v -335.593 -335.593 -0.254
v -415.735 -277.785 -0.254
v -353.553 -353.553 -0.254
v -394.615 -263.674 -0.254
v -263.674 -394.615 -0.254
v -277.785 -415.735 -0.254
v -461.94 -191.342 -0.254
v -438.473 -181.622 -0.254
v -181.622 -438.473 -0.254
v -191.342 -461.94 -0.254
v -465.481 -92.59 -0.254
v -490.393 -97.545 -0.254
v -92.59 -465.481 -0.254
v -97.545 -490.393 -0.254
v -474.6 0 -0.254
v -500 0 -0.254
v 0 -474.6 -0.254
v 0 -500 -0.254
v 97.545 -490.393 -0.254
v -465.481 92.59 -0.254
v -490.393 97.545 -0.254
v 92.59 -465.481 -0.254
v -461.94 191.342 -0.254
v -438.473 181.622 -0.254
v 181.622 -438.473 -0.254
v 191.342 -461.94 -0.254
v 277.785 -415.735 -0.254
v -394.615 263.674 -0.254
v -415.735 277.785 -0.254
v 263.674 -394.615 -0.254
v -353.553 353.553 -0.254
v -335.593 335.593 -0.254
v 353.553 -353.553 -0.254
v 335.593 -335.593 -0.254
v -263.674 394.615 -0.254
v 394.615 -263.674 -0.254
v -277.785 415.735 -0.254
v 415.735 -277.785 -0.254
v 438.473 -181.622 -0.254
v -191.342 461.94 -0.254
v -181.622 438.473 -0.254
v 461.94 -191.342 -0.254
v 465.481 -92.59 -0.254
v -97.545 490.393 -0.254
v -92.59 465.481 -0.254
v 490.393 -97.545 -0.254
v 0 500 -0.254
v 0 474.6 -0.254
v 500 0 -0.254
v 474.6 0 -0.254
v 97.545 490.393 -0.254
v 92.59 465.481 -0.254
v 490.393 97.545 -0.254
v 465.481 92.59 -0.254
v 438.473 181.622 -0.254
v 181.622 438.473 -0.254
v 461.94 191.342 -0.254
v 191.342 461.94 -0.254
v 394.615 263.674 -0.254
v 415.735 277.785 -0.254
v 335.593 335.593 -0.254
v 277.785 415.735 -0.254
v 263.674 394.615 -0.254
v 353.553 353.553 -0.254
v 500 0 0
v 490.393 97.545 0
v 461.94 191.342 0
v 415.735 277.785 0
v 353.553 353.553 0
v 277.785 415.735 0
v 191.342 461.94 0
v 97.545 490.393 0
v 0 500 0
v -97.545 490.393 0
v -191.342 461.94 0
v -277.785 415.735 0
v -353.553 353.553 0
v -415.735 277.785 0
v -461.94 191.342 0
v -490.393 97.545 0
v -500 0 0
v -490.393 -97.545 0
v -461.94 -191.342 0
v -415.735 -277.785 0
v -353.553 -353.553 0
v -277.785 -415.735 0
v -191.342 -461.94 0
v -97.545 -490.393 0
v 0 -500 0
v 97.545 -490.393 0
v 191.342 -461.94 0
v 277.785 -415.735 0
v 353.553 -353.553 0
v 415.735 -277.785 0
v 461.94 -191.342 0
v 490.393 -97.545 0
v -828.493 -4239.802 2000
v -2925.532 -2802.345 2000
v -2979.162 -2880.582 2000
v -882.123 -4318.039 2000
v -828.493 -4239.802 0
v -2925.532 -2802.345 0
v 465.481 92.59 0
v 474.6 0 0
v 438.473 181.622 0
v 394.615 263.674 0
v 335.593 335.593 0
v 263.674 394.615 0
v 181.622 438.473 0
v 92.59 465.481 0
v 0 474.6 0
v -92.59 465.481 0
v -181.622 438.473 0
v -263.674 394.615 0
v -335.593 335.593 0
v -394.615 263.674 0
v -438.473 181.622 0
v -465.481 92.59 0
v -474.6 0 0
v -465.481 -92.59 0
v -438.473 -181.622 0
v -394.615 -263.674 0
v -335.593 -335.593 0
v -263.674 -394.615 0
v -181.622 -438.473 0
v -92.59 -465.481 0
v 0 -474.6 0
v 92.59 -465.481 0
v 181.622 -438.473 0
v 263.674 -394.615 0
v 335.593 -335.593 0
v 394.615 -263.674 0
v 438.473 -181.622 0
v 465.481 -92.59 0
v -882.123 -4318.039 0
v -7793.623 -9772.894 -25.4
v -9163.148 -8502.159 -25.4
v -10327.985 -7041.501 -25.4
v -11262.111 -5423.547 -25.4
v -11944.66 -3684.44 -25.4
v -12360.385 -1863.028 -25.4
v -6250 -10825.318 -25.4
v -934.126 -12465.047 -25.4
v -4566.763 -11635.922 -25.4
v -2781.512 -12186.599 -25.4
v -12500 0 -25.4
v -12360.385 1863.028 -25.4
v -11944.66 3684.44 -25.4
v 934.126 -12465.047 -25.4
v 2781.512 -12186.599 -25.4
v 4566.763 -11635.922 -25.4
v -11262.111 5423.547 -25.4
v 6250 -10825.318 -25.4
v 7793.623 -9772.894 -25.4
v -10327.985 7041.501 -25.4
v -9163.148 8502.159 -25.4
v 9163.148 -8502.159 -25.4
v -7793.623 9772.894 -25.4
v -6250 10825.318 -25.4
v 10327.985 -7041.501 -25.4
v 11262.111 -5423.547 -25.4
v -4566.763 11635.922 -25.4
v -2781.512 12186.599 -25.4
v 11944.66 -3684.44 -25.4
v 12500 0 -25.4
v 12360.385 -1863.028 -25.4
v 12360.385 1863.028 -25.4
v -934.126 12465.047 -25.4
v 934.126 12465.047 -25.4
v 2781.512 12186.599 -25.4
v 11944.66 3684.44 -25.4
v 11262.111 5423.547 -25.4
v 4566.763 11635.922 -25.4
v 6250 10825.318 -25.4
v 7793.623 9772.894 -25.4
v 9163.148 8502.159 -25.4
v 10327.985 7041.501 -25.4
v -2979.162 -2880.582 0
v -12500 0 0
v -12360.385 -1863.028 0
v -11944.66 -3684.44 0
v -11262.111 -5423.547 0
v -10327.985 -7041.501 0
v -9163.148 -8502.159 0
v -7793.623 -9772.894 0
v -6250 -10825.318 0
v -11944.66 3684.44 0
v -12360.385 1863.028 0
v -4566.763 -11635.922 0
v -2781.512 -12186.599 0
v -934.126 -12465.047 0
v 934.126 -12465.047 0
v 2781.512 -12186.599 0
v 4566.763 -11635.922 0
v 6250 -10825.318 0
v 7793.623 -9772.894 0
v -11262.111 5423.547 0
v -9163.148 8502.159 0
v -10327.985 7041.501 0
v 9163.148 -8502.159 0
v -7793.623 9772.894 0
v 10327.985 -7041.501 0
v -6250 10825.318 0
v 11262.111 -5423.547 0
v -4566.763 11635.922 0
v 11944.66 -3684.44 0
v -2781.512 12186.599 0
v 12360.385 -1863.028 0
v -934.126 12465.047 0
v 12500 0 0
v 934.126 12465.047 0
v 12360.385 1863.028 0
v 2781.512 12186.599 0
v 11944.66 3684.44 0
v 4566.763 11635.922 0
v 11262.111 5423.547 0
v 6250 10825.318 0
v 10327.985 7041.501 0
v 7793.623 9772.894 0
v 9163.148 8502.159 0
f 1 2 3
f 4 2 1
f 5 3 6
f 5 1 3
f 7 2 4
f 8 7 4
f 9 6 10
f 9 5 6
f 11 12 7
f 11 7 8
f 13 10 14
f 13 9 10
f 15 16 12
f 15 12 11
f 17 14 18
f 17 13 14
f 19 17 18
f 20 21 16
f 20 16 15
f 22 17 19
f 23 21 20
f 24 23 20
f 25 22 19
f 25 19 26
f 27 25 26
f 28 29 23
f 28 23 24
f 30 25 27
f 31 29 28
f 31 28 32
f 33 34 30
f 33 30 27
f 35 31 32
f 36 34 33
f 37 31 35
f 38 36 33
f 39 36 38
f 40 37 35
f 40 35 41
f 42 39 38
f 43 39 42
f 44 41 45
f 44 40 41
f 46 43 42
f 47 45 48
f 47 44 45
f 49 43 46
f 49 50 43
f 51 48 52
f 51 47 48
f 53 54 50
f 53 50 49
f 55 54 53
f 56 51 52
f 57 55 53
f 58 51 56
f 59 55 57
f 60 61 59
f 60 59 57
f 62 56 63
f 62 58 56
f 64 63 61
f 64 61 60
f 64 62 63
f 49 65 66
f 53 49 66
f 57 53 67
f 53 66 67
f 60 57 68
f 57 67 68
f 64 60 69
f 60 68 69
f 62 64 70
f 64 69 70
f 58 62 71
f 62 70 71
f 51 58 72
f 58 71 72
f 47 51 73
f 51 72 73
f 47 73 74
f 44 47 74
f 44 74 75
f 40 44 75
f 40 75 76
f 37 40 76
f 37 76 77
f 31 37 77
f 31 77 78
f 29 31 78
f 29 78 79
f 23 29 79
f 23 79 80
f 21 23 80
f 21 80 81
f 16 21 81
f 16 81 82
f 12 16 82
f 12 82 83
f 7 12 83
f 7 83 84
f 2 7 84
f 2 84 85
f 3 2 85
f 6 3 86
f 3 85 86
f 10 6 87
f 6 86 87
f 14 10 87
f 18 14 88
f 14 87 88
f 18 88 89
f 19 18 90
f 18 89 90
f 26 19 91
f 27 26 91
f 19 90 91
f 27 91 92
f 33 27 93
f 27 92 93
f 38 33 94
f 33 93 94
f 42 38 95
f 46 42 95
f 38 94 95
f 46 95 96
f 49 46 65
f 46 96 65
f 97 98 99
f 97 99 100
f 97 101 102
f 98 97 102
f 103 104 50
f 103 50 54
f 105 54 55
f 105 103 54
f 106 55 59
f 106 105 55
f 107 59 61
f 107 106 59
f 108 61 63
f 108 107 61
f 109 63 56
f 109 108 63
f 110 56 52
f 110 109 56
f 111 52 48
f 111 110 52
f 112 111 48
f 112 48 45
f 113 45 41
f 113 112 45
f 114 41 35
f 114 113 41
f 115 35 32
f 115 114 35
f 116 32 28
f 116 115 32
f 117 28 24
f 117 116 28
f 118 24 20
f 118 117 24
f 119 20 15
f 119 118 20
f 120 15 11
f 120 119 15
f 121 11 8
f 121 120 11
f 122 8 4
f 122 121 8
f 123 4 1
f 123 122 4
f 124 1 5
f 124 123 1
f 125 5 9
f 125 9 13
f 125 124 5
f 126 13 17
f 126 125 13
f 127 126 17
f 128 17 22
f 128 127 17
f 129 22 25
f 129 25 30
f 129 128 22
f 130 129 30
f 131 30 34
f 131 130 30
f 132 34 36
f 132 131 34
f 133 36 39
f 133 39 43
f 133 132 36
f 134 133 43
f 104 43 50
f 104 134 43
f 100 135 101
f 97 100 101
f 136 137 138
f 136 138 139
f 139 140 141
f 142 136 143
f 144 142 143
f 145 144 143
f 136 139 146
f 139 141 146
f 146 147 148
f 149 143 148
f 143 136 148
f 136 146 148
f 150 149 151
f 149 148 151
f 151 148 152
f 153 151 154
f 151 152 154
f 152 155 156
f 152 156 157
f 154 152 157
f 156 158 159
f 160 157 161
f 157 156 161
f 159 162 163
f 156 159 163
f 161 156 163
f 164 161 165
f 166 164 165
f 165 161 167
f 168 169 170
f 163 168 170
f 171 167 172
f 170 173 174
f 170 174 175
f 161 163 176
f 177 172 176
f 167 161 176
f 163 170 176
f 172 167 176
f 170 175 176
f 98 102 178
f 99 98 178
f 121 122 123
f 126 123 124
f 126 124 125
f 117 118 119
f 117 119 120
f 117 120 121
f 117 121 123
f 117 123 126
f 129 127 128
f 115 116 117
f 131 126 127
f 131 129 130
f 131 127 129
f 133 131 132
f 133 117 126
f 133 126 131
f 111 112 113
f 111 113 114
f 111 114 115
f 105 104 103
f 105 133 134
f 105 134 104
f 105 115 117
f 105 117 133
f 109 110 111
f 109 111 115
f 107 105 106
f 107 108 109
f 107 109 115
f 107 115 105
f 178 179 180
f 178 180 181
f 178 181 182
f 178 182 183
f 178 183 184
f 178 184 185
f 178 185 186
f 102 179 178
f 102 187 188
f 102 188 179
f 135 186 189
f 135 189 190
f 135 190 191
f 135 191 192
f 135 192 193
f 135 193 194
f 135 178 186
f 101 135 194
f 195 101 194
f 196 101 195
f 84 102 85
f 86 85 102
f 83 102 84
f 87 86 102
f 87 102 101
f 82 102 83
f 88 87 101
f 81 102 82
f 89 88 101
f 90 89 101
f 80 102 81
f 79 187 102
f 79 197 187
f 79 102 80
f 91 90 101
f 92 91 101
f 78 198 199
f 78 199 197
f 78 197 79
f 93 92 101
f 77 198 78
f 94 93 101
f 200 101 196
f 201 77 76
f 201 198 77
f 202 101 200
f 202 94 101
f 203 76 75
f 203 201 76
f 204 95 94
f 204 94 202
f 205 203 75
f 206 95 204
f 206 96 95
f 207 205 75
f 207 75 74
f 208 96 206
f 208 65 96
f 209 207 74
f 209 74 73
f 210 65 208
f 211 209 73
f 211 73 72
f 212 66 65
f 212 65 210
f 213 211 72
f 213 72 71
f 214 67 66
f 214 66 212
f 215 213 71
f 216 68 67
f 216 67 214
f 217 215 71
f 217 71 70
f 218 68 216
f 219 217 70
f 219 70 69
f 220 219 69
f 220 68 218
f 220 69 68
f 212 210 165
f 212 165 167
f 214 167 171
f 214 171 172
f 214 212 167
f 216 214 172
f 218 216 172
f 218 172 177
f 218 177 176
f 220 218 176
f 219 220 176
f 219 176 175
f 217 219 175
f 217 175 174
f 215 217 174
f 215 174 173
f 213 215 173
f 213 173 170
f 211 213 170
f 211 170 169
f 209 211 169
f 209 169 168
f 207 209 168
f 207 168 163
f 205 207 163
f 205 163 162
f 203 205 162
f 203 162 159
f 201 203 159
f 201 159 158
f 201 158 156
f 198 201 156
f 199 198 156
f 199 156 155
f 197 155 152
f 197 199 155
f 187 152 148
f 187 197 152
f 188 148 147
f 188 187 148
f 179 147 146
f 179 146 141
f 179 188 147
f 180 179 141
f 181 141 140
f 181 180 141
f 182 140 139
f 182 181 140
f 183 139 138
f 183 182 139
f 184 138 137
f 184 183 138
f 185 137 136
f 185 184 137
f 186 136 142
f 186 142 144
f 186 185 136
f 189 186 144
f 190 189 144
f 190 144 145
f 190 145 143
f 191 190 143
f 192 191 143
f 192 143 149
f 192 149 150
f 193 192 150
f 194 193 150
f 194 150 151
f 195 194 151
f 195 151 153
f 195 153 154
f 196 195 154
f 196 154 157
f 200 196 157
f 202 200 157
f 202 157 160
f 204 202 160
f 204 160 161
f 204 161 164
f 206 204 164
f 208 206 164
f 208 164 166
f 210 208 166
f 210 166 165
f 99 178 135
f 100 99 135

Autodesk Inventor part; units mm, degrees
ref_plane "YZ Plane" through (0, 0, 0) normal (1, 0, 0) x (0, 1, 0)
ref_plane "XZ Plane" through (0, 0, 0) normal (0, 1, 0) x (-1, 0, 0)
ref_plane "XY Plane" through (0, 0, 0) normal (0, 0, 1) x (1, 0, 0)
sketch "Sketch1" plane through (0, 0, 0) normal (0, 0, 1) x (1, 0, 0)
  circle A0 centre (0, 0) radius 12500
  dimension "d8" = 25000
extrude "Extrusion1" add sketch "Sketch1" against normal blind 25.4
sketch "Sketch2" plane through (0, 0, 0) normal (0, 0, 1) x (1, 0, 0)
  circle A0 centre (0, 0) radius 12500 projected
  circle A1 centre (0, 0) radius 500
  circle A2 centre (0, 0) radius 474.6
  dimension "d2" = 1000
  dimension "d7" = 25.4
extrude "Extrusion2" cut sketch "Sketch2" against normal blind 0.254 contours A1
sketch "Sketch3" plane through (0, 0, 0) normal (0, 0, 1) x (1, 0, 0)
  circle A0 centre (0, 0) radius 500 projected
  circle A1 centre (0, 0) radius 12500 projected
  circle A2 centre (0, 0) radius 500 projected
  line L0 (4523.4478, -4083.8637) -> (3719.9636, -4724.5165)
  line L1 (3719.9636, -4724.5165) -> (3734.5609, -4742.824)
  line L2 (3734.5609, -4742.824) -> (4538.0452, -4102.1712)
  line L3 (4538.0452, -4102.1712) -> (4523.4478, -4083.8637)
  line L4 (4523.4478, -4083.8637) -> (3734.5609, -4742.824) construction
  line L5 (3719.9636, -4724.5165) -> (4538.0452, -4102.1712) construction
  line L6 (-828.4932, -4239.8018) -> (-2925.5322, -2802.3449)
  line L7 (-2925.5322, -2802.3449) -> (-2979.1615, -2880.5823)
  line L8 (-2979.1615, -2880.5823) -> (-882.1226, -4318.0392)
  line L9 (-882.1226, -4318.0392) -> (-828.4932, -4239.8018)
  point P0 (4129.0044, -4413.3439)
  point P1 (-1564.9759, -4707.8399)
extrude "Extrusion3" add sketch "Sketch3" along normal blind 2000 contours L9 L8 L7 L6
sketch "Sketch4" plane through (-882.1226, -4318.0392, 0) normal (-0.5653912, -0.8248229, 0) x (0.8248229, -0.5653912, 0)
  line L0 (0, 0) -> (-2542.4112, 0) projected
  line L1 (0, 0) -> (0, 2000) projected
  line L2 (-2542.4112, 2000) -> (0, 2000) projected
  line L3 (-2542.4112, 0) -> (-2542.4112, 2000) projected
  point P0 (-1713.7864, 0)
extrude "Extrusion4" [suppressed]
properties part number "world"
